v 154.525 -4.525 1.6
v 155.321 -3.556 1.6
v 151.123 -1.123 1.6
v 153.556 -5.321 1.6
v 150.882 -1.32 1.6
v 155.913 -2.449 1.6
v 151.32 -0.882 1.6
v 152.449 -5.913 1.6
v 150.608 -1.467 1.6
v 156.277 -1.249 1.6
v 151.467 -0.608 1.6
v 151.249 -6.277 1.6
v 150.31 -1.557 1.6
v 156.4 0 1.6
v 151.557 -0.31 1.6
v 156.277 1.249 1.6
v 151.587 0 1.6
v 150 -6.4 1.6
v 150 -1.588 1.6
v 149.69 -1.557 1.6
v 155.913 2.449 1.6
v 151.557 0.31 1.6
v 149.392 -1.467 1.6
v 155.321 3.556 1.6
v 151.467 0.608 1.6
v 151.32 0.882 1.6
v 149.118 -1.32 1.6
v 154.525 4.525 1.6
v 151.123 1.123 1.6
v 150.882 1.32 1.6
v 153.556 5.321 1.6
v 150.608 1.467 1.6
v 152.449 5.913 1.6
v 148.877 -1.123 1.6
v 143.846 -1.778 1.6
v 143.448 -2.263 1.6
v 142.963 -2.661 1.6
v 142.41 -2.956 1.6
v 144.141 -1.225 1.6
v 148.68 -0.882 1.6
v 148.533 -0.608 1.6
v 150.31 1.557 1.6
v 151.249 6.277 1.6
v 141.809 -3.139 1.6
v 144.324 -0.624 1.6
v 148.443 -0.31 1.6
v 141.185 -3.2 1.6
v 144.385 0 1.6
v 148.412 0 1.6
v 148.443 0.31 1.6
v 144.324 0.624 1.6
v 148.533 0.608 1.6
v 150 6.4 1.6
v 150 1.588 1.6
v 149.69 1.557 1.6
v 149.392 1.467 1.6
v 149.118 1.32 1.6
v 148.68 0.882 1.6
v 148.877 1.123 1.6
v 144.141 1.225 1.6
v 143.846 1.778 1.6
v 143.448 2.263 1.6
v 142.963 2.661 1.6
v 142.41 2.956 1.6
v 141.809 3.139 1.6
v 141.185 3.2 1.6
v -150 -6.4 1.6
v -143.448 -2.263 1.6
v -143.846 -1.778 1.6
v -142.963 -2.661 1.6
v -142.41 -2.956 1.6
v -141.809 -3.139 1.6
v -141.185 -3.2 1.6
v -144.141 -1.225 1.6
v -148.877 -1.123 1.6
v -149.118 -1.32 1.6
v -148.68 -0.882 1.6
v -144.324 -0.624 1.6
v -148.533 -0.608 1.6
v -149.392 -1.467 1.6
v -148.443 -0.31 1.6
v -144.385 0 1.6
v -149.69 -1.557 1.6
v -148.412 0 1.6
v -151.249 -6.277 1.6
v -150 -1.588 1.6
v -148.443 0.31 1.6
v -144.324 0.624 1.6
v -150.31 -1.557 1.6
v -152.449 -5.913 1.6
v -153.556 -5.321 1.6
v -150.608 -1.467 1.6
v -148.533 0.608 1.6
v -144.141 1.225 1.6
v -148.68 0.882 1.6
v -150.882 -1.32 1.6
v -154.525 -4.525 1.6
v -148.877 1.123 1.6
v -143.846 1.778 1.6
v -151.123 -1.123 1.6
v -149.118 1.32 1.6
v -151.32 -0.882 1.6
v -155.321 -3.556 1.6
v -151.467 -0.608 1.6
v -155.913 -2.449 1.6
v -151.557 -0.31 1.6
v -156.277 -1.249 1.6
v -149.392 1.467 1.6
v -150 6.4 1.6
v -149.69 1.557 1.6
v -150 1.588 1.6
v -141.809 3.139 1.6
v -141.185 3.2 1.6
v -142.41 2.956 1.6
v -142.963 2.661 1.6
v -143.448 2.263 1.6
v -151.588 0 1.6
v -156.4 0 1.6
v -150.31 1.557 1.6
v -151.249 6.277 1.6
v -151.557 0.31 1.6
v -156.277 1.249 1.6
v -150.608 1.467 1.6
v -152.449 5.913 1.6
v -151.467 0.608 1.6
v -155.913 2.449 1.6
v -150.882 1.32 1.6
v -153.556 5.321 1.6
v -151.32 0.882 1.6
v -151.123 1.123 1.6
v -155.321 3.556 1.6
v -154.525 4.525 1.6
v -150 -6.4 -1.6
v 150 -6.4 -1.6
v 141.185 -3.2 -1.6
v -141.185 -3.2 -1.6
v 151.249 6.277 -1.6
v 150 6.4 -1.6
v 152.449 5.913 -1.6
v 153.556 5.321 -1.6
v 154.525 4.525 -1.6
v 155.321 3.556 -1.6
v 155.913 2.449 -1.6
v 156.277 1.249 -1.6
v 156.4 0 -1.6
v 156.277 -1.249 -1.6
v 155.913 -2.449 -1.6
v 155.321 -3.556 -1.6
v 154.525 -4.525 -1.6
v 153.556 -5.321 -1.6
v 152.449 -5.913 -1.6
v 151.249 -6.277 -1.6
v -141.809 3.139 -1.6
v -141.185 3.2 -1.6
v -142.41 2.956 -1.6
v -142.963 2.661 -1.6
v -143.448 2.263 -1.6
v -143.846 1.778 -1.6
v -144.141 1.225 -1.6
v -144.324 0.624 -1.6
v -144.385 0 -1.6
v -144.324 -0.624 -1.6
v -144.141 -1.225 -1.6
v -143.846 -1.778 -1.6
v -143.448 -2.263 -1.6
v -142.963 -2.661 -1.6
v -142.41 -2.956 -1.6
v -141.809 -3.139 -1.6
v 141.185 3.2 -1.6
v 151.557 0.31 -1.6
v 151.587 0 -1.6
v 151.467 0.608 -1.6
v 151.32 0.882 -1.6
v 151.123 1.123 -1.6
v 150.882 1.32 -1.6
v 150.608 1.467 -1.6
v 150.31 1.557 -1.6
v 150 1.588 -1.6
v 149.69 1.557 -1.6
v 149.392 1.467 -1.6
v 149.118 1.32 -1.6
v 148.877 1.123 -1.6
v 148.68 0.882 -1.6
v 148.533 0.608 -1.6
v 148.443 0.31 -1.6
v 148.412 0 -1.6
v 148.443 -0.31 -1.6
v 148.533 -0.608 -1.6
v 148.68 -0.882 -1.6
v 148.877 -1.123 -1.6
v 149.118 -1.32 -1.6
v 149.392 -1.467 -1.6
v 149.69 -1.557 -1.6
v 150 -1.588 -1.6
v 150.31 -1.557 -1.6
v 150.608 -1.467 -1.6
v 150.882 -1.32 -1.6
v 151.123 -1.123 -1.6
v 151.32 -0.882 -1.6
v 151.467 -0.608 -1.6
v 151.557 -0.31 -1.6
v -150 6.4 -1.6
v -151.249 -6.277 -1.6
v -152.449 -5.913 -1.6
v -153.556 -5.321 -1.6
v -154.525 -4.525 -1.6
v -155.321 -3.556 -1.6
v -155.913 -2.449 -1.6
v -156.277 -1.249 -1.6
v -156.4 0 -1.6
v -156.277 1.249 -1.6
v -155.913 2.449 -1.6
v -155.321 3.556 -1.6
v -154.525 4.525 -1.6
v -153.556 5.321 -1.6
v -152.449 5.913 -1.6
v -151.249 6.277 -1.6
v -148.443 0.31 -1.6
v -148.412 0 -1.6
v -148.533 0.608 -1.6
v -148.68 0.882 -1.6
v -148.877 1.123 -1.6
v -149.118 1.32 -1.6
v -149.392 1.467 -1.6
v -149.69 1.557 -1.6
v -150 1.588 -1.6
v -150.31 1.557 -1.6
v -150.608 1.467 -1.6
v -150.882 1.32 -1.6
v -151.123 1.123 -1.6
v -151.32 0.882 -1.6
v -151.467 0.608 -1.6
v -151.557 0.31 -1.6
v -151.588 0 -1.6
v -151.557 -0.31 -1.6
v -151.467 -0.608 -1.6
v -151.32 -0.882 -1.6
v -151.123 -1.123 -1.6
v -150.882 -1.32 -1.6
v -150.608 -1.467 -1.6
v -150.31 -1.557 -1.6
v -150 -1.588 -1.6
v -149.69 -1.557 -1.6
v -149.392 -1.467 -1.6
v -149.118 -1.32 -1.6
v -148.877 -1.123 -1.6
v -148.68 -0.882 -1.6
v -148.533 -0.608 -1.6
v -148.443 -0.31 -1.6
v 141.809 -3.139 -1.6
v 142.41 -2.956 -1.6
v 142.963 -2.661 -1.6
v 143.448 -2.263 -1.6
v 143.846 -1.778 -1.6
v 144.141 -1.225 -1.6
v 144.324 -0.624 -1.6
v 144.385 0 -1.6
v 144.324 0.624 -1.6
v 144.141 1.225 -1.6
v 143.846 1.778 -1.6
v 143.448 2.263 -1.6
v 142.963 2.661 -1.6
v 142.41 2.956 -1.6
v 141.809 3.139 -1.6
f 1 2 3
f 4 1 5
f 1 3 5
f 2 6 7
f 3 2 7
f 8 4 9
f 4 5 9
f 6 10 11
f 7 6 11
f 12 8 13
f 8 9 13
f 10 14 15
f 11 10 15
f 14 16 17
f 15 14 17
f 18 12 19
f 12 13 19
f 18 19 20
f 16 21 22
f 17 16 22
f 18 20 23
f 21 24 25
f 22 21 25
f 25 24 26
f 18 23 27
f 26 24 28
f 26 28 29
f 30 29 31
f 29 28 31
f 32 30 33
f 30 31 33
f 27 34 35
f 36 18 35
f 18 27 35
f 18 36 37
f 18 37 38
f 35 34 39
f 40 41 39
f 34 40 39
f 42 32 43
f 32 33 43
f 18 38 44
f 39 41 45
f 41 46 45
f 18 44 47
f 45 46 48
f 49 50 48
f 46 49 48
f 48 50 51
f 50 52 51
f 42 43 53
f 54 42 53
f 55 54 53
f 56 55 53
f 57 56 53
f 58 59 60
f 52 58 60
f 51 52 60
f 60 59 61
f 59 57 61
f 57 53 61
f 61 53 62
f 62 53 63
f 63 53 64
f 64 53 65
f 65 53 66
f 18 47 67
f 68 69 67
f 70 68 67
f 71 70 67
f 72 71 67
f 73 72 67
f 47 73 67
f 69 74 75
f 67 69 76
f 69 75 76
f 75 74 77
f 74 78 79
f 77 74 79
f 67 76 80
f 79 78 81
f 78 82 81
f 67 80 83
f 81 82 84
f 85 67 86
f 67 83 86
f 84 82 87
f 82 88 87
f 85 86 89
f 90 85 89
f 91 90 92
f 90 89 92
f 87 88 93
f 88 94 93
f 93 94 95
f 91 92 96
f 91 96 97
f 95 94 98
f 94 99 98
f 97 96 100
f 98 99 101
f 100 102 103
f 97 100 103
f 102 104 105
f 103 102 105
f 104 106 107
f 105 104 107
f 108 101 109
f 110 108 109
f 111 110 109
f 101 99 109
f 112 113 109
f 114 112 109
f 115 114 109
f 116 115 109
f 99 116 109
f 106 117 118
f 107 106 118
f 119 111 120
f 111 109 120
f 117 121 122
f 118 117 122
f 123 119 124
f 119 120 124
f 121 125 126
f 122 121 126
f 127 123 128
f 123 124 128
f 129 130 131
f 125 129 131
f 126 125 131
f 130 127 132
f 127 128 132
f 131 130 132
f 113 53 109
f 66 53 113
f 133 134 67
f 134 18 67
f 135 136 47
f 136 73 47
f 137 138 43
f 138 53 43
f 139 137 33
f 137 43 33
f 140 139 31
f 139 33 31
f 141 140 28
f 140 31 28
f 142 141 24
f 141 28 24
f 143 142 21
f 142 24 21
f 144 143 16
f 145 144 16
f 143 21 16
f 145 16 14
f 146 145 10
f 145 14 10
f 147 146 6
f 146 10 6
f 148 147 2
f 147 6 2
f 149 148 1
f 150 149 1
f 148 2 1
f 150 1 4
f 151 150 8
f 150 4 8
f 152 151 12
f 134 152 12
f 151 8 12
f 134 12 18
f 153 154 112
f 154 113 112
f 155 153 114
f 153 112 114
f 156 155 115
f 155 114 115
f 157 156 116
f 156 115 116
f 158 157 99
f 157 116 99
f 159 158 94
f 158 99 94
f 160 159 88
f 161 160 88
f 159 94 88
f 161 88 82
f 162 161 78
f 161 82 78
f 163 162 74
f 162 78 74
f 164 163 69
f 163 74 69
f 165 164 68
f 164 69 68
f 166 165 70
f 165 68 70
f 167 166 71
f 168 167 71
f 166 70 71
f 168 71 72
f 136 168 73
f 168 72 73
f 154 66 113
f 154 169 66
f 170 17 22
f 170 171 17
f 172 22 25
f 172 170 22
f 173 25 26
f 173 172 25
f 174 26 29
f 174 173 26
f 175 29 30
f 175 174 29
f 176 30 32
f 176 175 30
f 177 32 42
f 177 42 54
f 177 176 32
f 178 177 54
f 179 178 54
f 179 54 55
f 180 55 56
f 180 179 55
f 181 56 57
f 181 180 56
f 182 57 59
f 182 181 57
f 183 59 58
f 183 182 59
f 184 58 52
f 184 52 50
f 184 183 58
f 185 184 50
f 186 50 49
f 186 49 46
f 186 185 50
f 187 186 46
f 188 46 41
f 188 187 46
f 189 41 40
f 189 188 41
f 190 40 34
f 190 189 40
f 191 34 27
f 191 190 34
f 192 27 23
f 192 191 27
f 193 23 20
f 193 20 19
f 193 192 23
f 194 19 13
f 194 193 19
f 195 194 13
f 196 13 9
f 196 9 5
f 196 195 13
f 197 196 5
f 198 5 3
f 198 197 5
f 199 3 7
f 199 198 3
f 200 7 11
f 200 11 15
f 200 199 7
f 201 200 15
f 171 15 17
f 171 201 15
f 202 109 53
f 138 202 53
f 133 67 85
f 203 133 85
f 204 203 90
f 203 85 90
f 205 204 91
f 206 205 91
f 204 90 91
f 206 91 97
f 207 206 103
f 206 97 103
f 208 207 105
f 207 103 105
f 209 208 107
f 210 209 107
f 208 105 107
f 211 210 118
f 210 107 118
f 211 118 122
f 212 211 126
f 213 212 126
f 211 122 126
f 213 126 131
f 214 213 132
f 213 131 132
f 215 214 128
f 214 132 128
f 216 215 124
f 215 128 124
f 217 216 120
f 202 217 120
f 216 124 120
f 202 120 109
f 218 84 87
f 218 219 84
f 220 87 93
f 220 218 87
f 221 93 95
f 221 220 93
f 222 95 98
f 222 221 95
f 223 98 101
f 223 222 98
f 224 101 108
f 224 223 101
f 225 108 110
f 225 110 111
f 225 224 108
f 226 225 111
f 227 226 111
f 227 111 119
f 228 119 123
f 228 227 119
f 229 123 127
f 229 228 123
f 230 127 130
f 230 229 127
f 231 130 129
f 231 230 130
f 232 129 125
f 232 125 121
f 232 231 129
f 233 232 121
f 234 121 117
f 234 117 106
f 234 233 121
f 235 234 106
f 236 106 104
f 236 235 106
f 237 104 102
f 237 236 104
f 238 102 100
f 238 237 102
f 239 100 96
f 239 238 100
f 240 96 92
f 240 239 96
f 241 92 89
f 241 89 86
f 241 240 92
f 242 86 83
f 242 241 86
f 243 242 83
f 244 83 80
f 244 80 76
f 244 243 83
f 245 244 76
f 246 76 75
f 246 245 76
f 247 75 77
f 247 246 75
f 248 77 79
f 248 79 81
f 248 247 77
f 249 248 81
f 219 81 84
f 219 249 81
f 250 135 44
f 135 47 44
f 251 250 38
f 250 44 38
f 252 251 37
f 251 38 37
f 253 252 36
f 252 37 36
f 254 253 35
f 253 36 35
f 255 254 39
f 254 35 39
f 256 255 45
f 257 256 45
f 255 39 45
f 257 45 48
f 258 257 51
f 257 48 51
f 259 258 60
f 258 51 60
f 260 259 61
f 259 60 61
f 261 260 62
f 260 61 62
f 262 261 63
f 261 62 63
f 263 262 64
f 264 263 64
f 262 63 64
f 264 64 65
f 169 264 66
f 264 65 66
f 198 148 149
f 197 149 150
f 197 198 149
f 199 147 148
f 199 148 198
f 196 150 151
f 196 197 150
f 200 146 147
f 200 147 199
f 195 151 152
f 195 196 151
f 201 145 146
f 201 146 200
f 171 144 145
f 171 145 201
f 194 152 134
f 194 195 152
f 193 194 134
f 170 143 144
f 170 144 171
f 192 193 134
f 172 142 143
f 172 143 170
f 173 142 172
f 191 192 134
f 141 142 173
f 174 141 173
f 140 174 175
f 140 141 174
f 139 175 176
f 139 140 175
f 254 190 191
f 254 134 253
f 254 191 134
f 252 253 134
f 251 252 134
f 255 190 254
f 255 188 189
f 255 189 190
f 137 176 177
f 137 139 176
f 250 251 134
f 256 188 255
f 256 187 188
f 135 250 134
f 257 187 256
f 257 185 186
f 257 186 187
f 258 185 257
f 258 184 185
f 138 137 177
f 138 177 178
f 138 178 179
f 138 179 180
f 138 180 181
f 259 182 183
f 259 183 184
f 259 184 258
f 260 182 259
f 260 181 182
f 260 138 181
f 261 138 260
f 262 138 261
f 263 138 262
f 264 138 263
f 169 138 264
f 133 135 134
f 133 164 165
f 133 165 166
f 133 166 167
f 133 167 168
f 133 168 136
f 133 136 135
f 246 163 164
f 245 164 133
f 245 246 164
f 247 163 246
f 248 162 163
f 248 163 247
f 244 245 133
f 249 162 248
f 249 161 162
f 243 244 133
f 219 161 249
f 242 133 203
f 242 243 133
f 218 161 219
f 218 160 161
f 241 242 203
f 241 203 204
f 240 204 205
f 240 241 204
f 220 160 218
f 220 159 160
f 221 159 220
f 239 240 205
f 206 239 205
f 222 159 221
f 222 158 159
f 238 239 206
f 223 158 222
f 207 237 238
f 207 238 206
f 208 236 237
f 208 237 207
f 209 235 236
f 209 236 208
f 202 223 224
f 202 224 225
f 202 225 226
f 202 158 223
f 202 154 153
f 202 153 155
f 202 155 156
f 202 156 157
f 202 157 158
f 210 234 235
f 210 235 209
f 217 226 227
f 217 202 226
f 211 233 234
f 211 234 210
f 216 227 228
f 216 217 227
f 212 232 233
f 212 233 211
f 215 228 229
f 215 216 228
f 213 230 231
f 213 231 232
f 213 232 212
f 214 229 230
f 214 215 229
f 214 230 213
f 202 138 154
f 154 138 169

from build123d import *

# Parameters (mm, degrees)
SKETCH1_R           = 1.5875
BOSS_EXTRUDE2_DEPTH = 1.6


with BuildPart() as part:
    # Sketch1 → Boss-Extrude2 (new, symmetric)
    with BuildSketch(Plane.XY):
        with BuildLine():
            Line((-149.999999691, 6.4), (149.999999691, 6.4))
            ThreePointArc((149.999999691, 6.4), (156.399999534, -1.57e-07), (149.999999377, -6.4))
            Line((149.999999377, -6.4), (-149.999999377, -6.4))
            ThreePointArc((-149.999999377, -6.4), (-156.4, -1.57e-07), (-149.999999691, 6.4))
        make_face()
        with Locations((-150, 0)):
            Circle(SKETCH1_R, mode=Mode.SUBTRACT)
        with Locations((149.999999534, 0)):
            Circle(SKETCH1_R, mode=Mode.SUBTRACT)
        with BuildLine():
            Line((141.185, 3.2), (-141.185, 3.2))
            ThreePointArc((-141.185, 3.2), (-144.385, 0), (-141.185, -3.2))
            Line((-141.185, -3.2), (141.185, -3.2))
            ThreePointArc((141.185, -3.2), (144.385, 0), (141.185, 3.2))
        make_face(mode=Mode.SUBTRACT)
    extrude(amount=BOSS_EXTRUDE2_DEPTH, both=True)


solid = part.part
